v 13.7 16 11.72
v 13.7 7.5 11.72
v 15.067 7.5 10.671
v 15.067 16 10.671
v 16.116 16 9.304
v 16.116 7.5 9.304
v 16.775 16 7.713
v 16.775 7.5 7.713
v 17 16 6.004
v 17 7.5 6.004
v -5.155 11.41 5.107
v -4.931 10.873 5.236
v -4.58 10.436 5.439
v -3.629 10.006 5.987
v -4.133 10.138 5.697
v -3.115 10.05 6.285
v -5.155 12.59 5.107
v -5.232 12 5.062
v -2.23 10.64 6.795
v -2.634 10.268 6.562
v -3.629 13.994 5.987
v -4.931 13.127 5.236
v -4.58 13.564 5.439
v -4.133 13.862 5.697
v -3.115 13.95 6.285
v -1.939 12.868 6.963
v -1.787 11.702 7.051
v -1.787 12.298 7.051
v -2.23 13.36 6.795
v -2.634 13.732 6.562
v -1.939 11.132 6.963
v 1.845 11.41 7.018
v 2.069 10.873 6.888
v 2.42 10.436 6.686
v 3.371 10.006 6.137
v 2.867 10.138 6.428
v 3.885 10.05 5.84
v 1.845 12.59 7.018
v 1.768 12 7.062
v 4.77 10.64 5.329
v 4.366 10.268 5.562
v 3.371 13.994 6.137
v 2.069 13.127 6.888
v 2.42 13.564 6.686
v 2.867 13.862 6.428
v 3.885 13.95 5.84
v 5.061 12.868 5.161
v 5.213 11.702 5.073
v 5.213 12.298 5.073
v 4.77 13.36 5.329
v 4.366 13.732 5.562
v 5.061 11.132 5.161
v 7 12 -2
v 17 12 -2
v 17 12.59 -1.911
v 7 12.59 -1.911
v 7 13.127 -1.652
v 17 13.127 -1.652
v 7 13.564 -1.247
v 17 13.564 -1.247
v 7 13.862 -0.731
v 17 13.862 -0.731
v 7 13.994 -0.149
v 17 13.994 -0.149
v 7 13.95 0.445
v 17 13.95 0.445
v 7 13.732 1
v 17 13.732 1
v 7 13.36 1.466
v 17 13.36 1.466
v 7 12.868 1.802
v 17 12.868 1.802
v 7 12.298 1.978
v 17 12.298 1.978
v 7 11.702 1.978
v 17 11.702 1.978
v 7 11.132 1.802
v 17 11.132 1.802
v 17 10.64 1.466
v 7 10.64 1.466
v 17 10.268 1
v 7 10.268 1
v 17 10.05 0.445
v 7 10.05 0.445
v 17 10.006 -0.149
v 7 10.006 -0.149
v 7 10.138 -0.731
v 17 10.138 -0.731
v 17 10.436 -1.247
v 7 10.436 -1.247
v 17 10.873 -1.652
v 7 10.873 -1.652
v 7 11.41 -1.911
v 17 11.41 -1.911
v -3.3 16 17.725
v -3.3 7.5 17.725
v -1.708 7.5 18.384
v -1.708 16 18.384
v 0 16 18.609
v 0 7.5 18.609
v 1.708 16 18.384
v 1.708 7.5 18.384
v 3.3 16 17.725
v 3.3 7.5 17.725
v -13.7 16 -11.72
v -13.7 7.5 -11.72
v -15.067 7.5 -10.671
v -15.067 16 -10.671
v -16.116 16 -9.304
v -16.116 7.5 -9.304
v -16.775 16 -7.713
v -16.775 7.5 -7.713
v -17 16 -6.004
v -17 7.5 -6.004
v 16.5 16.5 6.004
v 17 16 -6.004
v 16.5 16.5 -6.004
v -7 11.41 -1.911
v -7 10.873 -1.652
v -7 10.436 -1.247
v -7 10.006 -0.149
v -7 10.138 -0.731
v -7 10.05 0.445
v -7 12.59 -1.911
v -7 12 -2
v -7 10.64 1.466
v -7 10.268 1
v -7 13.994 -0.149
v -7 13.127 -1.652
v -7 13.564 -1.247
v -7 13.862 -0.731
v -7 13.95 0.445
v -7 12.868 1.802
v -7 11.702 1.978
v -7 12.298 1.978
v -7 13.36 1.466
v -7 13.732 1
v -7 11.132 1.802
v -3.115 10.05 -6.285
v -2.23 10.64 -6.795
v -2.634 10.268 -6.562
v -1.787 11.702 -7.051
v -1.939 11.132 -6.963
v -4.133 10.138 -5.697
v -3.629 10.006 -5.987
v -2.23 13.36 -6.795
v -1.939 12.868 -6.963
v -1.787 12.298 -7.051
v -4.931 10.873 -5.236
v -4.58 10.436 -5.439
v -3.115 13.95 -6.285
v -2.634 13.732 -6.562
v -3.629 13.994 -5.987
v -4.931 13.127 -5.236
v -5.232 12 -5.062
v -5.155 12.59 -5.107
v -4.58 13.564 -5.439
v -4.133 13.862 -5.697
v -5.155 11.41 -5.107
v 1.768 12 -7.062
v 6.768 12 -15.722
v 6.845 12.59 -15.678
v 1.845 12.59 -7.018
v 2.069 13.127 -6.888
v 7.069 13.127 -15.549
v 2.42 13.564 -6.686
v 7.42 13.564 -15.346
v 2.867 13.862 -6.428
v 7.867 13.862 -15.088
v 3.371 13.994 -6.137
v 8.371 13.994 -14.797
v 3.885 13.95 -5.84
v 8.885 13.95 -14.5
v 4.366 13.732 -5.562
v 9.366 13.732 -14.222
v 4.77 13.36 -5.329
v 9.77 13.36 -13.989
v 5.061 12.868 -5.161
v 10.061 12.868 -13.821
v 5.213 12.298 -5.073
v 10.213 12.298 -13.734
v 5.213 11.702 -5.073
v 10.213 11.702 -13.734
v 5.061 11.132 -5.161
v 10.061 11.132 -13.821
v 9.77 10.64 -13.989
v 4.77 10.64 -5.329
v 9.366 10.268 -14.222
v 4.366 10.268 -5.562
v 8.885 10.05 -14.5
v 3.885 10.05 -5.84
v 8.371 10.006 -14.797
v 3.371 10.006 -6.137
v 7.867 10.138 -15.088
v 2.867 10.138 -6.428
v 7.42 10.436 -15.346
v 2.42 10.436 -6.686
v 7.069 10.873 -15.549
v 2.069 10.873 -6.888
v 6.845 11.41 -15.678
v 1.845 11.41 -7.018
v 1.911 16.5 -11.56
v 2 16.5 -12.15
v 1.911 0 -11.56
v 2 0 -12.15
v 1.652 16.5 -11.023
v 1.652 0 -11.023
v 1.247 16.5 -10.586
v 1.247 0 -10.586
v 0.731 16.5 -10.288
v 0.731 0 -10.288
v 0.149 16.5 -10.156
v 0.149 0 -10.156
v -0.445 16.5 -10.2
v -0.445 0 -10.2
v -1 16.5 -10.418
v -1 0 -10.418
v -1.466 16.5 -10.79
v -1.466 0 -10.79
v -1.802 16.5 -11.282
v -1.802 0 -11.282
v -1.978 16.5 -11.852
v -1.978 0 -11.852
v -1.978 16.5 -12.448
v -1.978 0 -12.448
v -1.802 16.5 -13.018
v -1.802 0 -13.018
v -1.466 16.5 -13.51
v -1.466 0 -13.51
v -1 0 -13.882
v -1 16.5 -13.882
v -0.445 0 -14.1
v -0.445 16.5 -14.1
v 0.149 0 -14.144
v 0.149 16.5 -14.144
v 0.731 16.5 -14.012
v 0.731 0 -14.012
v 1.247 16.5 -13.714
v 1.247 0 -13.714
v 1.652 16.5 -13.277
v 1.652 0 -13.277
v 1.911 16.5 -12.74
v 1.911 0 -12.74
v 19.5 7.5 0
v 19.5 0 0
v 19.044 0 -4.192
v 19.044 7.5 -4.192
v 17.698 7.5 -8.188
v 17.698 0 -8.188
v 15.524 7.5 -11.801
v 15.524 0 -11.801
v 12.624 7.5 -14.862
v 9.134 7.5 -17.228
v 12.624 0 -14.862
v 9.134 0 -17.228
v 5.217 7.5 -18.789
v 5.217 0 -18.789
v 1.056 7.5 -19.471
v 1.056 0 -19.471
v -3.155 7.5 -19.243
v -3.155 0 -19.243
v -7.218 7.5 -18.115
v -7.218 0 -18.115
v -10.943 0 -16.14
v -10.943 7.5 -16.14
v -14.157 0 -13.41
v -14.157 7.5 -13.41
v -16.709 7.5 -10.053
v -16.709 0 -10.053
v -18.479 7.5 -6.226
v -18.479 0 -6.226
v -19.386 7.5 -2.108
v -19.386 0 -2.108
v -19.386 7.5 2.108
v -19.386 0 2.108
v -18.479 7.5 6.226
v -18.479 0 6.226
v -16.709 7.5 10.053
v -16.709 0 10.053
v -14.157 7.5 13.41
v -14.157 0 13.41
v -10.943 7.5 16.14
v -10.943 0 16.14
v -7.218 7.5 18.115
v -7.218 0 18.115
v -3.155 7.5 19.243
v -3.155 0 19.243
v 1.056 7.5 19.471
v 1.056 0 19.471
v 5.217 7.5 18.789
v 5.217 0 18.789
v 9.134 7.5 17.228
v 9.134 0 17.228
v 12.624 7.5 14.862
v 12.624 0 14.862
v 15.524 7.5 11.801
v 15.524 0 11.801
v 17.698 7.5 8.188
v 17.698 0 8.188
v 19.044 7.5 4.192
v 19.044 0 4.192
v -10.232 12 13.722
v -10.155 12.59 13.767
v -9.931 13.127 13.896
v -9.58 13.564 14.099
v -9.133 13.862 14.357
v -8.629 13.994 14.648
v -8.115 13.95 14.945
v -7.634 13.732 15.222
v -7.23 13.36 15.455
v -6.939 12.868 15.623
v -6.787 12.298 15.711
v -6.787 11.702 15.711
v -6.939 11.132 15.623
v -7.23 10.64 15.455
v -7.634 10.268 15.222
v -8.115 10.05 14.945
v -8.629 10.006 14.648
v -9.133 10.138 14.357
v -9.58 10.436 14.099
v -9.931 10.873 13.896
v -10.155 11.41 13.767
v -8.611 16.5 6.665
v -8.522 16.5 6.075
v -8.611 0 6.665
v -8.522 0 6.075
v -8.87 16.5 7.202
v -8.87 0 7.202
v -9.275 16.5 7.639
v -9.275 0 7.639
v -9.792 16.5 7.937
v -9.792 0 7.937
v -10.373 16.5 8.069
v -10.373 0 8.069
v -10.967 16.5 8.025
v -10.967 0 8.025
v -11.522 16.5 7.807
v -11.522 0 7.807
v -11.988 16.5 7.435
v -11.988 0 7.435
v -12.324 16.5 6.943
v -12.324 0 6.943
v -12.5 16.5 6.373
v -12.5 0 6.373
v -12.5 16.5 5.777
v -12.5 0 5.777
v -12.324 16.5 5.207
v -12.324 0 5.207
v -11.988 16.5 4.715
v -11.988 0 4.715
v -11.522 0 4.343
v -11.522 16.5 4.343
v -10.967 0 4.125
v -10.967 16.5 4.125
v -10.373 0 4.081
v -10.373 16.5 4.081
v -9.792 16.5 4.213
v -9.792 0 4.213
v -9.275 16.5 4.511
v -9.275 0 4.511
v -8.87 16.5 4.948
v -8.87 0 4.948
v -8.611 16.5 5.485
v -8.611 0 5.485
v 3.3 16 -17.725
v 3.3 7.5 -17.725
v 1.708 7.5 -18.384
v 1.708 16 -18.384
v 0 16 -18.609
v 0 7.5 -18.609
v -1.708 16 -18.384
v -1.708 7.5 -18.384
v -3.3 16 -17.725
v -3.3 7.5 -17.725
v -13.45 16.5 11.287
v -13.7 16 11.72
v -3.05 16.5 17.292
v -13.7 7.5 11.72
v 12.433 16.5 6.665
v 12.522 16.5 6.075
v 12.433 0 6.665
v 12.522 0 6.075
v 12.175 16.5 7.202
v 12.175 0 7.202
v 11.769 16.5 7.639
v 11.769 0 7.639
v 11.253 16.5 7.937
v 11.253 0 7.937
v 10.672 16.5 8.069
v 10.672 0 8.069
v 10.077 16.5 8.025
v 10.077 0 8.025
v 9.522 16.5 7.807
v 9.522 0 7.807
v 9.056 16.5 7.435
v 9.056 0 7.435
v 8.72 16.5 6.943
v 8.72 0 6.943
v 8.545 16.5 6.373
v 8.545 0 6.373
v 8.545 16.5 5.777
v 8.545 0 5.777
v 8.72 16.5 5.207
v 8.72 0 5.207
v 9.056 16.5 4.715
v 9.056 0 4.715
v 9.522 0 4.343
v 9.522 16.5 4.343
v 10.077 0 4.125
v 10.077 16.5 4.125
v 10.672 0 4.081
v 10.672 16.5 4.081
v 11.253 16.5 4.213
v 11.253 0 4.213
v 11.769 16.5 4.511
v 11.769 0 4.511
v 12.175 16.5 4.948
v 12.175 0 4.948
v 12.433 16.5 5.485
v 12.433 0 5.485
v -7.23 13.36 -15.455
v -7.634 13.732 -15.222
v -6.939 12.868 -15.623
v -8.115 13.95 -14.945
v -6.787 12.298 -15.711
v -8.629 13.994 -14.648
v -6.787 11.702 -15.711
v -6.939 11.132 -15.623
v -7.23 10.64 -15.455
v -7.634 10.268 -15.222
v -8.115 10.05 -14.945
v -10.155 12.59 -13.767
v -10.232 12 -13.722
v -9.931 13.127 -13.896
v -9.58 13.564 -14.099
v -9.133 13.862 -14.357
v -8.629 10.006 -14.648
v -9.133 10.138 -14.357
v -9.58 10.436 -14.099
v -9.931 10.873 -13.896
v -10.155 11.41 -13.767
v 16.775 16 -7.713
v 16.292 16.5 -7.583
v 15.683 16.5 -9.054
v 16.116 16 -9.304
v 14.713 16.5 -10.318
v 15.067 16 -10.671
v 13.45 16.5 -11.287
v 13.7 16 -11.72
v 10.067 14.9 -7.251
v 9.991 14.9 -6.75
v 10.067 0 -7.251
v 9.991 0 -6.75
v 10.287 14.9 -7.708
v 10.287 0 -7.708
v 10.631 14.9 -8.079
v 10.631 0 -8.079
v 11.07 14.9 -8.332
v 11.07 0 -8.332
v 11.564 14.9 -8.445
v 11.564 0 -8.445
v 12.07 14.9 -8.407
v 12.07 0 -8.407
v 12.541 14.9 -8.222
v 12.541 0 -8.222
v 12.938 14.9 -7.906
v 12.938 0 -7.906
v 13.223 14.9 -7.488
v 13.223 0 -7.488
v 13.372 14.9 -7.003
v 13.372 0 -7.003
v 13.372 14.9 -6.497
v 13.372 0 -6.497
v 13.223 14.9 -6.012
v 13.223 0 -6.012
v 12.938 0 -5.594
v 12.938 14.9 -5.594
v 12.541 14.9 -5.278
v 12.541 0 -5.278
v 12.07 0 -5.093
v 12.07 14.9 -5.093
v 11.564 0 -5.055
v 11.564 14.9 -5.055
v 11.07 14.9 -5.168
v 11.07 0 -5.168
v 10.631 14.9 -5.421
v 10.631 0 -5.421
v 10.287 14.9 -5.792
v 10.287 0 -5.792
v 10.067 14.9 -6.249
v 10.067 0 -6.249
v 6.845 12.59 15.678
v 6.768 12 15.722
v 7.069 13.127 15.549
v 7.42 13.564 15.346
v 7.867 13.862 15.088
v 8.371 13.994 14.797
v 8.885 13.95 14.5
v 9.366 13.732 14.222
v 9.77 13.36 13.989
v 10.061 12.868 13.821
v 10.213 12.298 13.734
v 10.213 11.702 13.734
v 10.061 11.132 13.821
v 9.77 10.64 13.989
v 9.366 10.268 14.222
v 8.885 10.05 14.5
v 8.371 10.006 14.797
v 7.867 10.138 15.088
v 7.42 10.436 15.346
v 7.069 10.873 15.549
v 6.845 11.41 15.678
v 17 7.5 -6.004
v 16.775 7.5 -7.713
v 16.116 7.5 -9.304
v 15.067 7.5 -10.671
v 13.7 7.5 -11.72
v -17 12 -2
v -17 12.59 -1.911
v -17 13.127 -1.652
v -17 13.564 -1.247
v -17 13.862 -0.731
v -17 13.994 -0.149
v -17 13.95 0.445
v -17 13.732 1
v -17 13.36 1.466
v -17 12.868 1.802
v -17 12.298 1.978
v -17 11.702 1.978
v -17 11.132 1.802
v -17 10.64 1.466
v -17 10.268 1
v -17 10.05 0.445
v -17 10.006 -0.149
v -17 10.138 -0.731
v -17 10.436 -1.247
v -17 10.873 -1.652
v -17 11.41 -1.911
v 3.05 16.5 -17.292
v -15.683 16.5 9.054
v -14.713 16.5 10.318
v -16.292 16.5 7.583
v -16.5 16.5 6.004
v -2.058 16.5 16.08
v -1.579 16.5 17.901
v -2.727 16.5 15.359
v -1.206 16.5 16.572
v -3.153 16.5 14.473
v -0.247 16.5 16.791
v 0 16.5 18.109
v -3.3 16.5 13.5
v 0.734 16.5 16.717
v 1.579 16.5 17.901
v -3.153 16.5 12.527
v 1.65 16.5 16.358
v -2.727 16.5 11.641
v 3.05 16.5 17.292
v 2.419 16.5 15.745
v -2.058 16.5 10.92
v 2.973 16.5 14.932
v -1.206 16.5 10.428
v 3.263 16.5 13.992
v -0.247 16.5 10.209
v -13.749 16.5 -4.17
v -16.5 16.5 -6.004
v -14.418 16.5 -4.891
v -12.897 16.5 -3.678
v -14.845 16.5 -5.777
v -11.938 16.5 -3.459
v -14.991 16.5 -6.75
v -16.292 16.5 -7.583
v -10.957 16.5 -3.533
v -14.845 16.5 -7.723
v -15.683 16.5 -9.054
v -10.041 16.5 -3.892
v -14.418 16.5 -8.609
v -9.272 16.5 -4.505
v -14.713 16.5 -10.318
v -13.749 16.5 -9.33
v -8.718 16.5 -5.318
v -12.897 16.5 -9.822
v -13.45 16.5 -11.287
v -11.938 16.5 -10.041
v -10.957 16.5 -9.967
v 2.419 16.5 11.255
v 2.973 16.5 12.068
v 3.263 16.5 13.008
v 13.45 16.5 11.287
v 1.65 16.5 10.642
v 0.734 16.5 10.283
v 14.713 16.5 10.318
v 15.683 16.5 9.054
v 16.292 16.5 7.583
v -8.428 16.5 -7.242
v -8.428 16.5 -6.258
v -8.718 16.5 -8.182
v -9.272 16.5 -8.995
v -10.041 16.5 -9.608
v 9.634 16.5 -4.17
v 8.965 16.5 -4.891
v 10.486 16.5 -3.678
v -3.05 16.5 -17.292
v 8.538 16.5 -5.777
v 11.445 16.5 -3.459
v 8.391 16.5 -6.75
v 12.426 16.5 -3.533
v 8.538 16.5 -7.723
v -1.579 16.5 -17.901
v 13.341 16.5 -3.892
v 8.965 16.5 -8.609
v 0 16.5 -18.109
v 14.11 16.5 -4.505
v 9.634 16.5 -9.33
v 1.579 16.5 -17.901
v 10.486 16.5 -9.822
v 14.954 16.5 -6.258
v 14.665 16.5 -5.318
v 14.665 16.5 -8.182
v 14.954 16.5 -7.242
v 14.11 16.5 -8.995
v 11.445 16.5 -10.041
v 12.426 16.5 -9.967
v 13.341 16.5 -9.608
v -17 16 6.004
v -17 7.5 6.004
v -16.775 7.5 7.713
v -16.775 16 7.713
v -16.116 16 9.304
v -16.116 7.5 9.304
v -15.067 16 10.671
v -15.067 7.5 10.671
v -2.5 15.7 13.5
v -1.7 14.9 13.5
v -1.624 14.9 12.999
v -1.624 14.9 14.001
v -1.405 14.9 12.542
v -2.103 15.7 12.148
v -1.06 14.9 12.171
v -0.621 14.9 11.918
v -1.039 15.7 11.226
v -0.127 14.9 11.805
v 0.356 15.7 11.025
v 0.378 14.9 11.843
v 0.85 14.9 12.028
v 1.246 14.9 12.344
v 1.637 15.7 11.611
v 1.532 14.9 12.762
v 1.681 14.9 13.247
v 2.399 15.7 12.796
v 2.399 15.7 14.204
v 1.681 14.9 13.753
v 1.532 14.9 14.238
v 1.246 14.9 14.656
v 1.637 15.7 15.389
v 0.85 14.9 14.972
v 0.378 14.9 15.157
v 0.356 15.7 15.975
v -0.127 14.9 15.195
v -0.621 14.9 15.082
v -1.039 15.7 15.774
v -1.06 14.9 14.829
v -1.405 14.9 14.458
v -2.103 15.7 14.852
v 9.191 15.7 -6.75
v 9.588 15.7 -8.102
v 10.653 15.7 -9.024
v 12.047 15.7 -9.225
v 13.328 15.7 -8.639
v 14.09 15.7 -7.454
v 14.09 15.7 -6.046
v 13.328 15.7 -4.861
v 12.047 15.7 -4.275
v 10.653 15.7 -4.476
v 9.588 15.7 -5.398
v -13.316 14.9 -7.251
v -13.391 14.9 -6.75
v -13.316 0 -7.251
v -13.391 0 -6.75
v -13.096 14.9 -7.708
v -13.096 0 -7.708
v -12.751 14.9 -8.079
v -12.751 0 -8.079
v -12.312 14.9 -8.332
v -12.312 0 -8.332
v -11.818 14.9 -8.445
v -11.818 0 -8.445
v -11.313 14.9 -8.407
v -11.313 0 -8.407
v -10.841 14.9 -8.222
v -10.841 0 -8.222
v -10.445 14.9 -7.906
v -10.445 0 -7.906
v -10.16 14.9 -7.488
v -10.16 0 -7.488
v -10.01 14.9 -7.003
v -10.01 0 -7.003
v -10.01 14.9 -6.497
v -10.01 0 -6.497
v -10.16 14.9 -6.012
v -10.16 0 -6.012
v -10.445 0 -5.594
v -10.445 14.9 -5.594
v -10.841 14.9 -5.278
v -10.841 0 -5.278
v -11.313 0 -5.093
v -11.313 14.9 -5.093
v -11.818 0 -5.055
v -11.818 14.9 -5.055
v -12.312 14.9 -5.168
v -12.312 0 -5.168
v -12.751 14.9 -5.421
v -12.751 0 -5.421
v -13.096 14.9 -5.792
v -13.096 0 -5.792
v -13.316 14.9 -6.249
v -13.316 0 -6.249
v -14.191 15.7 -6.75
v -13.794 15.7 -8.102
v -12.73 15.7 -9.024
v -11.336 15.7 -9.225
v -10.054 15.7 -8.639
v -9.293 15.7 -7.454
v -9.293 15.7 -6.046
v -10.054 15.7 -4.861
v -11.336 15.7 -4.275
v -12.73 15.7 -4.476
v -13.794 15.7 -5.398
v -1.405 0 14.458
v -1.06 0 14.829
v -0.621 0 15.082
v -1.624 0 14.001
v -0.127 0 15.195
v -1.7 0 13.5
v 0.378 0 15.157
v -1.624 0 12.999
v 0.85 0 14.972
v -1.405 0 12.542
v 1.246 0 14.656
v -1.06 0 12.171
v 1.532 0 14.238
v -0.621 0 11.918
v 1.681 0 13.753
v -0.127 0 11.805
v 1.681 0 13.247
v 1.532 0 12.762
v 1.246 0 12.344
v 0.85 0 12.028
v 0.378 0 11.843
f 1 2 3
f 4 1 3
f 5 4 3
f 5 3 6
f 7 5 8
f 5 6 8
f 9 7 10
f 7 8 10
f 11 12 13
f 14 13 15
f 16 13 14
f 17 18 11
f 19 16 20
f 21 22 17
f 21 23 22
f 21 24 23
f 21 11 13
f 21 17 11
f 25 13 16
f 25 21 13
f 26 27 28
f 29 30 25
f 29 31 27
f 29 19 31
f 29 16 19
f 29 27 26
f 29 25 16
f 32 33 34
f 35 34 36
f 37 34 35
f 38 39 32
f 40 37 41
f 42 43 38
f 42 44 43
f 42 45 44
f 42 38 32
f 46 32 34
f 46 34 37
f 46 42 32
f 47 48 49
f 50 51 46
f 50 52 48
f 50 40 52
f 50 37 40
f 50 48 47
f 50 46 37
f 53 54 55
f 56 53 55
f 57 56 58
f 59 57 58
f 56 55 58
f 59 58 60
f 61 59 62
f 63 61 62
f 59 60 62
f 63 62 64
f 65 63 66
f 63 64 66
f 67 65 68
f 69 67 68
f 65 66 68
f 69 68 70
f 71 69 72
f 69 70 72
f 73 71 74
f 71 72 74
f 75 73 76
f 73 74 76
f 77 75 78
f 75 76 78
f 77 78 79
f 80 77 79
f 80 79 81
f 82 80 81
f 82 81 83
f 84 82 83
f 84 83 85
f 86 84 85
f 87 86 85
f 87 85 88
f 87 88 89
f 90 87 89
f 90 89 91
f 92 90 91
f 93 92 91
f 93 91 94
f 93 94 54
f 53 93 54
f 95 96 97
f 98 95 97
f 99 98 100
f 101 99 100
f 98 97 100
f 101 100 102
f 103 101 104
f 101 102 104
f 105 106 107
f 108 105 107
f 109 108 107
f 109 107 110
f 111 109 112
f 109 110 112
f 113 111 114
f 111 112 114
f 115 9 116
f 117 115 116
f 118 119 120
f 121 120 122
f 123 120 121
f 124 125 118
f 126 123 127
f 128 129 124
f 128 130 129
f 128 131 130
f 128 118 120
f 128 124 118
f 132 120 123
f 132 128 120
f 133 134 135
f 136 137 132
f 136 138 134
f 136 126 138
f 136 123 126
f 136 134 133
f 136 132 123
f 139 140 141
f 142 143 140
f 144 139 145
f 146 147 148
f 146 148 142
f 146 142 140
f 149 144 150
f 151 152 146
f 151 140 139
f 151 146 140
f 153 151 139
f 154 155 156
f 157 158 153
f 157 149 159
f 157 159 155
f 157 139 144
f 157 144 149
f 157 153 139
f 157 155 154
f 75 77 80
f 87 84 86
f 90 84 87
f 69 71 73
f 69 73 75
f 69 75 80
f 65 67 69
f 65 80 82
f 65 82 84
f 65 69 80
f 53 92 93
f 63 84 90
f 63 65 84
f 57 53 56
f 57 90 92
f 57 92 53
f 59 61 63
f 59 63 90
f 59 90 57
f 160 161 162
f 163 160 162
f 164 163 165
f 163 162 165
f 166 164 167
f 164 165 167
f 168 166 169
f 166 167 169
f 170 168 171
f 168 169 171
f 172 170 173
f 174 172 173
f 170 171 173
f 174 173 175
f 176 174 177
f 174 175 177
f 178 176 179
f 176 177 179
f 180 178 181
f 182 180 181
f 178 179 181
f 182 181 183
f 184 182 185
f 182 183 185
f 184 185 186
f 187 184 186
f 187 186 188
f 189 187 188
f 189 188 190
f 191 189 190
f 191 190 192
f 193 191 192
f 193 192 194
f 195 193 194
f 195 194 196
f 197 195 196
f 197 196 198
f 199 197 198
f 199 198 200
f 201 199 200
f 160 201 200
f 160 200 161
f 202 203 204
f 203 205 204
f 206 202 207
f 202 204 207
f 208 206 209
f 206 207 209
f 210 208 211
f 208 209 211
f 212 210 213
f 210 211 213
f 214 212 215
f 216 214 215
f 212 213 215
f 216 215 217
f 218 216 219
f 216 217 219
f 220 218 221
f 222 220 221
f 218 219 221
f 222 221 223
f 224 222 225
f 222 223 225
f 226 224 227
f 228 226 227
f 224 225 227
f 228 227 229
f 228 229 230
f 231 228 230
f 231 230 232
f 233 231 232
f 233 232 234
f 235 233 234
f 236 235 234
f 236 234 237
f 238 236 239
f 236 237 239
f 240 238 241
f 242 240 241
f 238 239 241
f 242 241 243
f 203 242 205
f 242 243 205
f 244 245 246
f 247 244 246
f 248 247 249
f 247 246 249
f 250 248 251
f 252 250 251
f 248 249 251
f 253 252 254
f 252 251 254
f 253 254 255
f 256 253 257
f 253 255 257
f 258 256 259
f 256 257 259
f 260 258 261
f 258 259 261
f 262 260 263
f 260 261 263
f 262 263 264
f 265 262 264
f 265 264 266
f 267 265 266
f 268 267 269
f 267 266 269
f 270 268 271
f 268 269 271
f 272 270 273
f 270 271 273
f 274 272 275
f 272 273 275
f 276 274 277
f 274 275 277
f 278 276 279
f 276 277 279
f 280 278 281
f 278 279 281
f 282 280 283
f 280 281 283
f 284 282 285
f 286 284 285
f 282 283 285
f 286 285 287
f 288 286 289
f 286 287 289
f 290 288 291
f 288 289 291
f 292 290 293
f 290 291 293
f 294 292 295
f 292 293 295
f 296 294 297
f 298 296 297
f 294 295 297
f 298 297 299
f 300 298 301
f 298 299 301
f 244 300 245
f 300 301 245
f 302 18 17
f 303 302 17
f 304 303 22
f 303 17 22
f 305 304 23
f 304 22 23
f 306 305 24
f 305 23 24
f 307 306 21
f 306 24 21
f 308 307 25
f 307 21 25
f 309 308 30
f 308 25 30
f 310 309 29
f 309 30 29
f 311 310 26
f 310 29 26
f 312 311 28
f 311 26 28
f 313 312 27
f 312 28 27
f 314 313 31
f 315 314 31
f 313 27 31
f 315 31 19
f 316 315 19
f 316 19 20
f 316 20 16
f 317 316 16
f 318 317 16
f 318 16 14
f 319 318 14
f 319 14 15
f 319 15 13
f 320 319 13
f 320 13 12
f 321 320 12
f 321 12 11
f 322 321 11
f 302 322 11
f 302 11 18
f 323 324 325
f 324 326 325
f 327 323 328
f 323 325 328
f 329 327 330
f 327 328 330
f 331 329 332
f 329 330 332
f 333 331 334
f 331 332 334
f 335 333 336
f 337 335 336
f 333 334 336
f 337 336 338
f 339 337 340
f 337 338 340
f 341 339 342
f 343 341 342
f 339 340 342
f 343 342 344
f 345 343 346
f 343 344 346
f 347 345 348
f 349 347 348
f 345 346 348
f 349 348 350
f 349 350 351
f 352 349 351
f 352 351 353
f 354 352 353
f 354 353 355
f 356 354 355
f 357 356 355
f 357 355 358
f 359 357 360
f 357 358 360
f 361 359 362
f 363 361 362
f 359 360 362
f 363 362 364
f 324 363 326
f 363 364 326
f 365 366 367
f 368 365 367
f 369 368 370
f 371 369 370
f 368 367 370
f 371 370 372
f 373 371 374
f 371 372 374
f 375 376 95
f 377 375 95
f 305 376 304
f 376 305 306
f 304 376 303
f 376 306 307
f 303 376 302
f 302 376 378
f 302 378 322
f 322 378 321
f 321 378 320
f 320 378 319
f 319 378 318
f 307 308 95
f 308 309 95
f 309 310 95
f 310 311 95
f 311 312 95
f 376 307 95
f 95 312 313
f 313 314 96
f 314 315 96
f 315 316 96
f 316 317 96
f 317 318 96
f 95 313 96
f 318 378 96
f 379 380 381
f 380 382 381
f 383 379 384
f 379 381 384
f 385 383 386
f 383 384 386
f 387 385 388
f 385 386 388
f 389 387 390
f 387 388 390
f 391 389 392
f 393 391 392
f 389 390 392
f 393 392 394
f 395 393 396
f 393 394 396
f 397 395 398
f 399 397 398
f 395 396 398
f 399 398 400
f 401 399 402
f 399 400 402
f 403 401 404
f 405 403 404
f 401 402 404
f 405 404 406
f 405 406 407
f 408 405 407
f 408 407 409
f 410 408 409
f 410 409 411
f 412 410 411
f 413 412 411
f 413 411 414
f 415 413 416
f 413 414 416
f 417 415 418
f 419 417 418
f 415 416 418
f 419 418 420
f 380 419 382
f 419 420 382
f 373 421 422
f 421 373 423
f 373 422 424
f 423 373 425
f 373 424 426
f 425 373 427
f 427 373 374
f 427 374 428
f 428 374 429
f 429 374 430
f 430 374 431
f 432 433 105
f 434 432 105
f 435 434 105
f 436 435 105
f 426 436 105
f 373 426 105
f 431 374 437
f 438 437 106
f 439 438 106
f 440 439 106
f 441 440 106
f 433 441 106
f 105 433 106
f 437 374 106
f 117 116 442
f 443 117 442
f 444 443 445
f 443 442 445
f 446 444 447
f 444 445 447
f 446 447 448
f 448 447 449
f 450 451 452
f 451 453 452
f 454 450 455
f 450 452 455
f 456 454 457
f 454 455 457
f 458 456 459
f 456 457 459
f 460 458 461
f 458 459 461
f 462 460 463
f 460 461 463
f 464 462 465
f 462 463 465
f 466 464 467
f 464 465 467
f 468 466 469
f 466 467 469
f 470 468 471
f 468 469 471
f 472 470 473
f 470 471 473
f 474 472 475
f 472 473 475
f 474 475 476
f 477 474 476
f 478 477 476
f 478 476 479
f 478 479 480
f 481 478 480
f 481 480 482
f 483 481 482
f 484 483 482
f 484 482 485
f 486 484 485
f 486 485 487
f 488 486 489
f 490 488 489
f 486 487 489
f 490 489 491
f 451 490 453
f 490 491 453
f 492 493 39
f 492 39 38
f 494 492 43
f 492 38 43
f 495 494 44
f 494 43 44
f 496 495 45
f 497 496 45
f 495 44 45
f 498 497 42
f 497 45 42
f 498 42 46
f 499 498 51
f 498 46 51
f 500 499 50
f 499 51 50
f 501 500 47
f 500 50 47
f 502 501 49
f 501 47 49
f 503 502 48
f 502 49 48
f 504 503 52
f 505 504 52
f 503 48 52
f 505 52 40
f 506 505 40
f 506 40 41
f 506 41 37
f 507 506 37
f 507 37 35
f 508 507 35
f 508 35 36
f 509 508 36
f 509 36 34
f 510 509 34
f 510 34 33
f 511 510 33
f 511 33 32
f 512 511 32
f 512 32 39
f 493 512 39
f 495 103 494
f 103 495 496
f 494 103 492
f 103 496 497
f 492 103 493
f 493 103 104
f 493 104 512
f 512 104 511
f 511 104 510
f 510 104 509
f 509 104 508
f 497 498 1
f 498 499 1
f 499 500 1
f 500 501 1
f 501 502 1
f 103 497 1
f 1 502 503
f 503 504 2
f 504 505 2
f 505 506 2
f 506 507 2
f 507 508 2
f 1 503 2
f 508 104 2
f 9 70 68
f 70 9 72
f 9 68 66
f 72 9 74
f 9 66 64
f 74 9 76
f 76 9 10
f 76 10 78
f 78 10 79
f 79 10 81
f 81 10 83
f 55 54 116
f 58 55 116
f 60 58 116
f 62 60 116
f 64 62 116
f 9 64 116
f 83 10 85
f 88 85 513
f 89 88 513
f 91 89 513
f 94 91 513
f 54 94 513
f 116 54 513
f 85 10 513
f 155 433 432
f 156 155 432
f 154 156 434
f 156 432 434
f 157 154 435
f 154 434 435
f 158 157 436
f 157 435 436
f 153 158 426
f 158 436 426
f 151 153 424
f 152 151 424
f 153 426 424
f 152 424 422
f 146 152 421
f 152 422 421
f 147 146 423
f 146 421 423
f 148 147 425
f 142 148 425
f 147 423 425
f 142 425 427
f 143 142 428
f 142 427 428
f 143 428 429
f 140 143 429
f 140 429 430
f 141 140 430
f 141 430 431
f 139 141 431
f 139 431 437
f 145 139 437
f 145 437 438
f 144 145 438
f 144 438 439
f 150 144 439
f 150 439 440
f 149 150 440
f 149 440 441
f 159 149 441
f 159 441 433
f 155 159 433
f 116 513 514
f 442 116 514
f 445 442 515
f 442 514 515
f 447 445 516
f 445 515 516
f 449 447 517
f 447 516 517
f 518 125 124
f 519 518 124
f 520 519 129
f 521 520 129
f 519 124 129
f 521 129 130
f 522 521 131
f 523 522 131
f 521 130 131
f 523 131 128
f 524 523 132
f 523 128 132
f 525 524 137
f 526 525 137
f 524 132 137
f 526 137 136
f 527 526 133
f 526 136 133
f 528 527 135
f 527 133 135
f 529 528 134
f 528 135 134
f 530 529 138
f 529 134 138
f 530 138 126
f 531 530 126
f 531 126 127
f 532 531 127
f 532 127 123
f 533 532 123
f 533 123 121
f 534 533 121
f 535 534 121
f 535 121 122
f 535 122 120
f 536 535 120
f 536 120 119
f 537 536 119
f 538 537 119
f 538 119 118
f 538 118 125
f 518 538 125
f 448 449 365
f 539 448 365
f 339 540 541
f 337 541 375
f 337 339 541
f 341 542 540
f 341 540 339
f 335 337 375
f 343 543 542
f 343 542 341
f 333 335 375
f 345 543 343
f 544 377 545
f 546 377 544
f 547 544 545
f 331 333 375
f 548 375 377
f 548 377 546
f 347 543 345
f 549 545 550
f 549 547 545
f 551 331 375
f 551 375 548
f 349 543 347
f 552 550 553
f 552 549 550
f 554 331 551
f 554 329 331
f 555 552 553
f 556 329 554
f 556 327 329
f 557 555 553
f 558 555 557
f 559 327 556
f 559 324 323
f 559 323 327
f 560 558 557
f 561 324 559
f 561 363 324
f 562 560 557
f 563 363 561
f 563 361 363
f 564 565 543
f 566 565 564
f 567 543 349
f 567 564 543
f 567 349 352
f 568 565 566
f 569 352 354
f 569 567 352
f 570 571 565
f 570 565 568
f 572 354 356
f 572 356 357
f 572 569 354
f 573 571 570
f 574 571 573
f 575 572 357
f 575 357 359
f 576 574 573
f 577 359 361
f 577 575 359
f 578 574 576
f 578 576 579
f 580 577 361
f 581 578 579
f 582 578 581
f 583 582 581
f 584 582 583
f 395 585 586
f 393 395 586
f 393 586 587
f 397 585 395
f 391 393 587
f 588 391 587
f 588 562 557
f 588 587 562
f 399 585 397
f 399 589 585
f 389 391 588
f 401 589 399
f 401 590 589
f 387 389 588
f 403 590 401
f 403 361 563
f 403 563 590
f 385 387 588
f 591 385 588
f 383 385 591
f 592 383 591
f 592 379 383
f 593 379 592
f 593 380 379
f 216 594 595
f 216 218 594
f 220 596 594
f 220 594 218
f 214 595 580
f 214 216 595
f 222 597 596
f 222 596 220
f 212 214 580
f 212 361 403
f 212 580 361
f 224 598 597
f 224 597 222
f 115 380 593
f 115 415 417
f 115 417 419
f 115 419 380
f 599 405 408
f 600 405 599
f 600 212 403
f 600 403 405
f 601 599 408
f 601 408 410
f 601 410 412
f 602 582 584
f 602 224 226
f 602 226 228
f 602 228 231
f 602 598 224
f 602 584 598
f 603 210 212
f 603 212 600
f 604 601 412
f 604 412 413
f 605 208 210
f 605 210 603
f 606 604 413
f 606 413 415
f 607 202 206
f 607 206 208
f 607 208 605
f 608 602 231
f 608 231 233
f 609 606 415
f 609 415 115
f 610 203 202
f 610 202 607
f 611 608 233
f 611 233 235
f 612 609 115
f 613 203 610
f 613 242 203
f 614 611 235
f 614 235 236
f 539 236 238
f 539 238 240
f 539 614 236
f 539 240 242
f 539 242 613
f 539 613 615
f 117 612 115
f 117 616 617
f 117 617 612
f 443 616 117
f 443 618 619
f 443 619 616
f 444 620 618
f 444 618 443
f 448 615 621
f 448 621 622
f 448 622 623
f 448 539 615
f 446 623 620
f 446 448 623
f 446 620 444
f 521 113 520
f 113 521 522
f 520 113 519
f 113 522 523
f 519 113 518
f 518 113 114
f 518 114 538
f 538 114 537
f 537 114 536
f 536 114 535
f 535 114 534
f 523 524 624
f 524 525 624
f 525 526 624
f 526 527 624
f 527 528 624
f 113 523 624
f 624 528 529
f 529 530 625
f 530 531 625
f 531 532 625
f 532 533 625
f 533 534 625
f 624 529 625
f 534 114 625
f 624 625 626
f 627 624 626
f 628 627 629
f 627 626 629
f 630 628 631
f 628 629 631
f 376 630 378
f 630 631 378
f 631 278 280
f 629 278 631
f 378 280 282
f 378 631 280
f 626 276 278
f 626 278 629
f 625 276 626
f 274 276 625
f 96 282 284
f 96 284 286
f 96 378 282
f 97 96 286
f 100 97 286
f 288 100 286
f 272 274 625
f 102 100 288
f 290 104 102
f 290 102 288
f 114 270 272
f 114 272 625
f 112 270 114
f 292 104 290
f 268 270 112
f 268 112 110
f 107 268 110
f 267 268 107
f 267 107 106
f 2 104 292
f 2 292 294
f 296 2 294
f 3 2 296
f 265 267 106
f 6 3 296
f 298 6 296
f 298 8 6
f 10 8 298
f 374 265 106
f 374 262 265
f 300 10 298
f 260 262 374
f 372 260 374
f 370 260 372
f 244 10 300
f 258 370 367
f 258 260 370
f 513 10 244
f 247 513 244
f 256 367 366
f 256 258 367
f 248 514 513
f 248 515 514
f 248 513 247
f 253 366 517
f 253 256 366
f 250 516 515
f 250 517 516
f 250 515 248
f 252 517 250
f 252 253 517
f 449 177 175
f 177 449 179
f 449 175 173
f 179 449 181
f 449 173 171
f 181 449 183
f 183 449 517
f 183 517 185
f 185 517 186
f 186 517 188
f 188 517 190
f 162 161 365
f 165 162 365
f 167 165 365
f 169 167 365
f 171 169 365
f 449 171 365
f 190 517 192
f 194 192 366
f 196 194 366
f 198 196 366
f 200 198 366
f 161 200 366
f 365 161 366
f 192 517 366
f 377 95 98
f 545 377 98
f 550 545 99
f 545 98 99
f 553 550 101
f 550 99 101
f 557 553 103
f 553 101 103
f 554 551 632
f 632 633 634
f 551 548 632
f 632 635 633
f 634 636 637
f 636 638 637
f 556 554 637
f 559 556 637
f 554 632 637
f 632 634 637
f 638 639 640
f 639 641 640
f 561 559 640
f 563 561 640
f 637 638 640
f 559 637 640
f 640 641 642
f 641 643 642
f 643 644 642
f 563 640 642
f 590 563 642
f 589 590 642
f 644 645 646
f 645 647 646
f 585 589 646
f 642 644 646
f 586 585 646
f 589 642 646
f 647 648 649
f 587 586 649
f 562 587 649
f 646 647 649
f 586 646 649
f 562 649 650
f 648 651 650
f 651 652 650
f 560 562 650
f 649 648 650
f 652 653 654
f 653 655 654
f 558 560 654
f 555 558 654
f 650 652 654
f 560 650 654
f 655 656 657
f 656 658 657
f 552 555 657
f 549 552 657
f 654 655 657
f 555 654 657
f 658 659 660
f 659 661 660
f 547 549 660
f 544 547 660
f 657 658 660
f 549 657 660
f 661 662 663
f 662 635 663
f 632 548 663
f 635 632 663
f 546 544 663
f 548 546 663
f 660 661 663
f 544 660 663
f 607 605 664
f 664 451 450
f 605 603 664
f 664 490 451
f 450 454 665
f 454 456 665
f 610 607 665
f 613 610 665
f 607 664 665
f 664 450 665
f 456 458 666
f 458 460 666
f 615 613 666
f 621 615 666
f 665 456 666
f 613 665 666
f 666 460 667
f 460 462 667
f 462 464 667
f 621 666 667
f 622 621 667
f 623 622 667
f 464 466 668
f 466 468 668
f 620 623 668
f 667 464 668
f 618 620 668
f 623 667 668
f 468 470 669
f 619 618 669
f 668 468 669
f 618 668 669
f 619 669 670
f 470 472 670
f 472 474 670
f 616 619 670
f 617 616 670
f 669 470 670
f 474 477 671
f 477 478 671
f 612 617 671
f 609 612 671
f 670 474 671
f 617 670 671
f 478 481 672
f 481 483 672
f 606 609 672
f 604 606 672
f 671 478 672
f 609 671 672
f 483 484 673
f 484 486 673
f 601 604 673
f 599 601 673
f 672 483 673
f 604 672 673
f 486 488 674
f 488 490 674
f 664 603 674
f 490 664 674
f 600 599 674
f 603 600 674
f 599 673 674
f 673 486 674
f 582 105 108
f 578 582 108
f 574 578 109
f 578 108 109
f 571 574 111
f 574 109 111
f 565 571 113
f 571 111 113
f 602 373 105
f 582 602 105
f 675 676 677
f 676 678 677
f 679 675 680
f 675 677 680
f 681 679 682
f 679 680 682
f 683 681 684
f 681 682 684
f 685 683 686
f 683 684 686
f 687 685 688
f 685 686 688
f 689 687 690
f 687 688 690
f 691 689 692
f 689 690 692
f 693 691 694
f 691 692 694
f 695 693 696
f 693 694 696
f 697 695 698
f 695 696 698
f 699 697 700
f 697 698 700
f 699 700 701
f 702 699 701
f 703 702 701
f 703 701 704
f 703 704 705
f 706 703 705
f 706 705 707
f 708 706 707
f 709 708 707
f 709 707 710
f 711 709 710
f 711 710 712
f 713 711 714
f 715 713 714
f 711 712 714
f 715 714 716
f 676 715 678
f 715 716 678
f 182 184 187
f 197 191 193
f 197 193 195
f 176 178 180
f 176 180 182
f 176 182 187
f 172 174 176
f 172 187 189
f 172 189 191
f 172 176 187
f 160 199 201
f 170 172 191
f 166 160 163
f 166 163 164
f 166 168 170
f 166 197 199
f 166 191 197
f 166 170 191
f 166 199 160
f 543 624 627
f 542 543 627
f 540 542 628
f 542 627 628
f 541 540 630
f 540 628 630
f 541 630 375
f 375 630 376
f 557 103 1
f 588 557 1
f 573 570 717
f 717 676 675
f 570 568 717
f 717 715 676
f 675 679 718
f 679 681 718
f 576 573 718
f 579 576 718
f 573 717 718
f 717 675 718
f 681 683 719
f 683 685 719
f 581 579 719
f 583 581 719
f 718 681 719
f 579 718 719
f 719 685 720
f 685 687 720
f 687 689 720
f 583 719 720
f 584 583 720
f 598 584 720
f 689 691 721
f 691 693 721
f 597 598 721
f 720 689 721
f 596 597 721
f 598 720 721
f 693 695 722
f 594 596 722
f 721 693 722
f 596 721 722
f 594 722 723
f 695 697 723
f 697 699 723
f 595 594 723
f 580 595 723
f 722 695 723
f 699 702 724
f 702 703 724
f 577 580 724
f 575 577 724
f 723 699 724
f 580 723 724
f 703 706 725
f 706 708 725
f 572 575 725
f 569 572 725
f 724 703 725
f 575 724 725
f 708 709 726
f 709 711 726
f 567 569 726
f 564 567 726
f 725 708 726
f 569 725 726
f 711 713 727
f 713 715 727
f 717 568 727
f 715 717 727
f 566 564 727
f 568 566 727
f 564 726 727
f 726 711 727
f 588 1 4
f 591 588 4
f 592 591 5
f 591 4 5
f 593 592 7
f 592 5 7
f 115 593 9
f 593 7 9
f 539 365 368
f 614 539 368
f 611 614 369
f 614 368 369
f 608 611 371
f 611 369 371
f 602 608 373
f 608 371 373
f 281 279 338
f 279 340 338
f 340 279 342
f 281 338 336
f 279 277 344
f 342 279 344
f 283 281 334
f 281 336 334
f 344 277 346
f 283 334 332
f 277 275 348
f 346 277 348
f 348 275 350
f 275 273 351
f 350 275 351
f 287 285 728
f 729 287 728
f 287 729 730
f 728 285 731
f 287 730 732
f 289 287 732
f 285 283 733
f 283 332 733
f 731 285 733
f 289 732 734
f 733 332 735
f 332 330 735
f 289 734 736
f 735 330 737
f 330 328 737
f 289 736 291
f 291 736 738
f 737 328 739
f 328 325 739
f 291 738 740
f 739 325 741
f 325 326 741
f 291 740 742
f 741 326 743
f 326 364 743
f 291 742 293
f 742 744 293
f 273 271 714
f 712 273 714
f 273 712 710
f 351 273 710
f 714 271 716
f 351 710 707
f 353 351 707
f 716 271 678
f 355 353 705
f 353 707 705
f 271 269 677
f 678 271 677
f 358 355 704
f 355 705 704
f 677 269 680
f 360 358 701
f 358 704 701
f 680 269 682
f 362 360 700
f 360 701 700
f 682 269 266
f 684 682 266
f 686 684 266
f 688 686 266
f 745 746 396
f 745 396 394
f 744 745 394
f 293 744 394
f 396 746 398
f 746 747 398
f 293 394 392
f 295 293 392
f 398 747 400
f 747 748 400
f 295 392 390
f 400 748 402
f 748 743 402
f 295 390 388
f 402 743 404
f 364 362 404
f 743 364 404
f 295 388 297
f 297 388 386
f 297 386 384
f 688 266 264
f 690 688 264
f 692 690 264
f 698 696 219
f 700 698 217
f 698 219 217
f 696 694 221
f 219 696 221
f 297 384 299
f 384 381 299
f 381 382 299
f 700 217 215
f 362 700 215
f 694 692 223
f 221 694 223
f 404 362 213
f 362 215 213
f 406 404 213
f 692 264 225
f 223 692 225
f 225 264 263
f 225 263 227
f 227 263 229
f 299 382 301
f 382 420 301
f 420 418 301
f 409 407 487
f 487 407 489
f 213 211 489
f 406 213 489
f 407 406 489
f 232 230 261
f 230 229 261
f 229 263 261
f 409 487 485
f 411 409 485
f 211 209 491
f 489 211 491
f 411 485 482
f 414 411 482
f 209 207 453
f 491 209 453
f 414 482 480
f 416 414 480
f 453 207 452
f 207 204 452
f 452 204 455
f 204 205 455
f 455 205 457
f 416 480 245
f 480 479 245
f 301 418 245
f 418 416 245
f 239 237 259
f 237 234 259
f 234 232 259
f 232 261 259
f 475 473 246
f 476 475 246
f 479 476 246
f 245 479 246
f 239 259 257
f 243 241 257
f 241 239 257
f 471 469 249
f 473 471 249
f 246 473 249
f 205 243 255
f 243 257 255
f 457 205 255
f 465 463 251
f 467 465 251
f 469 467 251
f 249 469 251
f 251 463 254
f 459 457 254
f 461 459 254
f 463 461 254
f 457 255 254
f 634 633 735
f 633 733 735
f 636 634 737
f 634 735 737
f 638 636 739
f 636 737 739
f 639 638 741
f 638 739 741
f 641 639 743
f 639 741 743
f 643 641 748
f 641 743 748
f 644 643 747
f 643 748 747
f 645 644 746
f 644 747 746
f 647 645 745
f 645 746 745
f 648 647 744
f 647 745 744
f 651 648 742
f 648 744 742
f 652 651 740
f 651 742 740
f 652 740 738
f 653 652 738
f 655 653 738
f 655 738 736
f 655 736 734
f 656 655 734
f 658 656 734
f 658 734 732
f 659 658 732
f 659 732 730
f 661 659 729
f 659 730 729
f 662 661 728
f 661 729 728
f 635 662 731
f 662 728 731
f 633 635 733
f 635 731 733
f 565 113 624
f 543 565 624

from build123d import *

# Parameters (mm, degrees)
SKETCH_9_R                = 19.5
SKETCH_9_R_2              = 2
SKETCH_9_R_3              = 1.5
EXTRUDE_1_DEPTH           = 7.5
EXTRUDE_2_DEPTH           = 12
SKETCH_15_R               = 2
CUT_EXTRUDE_2_DEPTH       = 10.637495374
CUT_EXTRUDE_2_DEPTH_BACK  = 44.637495374
SKETCH_16_R               = 2
CUT_EXTRUDE_3_DEPTH       = 10.637495374
CUT_EXTRUDE_3_DEPTH_BACK  = 44.637495374
SKETCH_17_R               = 2
CUT_EXTRUDE_4_DEPTH       = 3.5
CUT_EXTRUDE_4_DEPTH_BACK  = 37.5
EXTRUDE_3_DEPTH           = 19.5
SKETCH_19_R               = 1.5
SKETCH_19_R_2             = 2
CUT_EXTRUDE_5_DEPTH       = 8.5
CUT_EXTRUDE_5_DEPTH_BACK  = 13
HOLE_WIZARD_3_D           = 3.4
HOLE_WIZARD_3_CSINK_D     = 6.6
HOLE_WIZARD_3_CSINK_ANGLE = 90
CUT_EXTRUDE_6_DEPTH       = 3
CHAMFER_2_SIZE            = 0.5
HOLE_WIZARD_4_D           = 3.2
HOLE_WIZARD_4_CSINK_D     = 6.6
HOLE_WIZARD_4_CSINK_ANGLE = 90


with BuildPart() as part:
    # 草图9 → 凸台-拉伸1 (new body)
    with BuildSketch(Plane(origin=(0, 0, 0), x_dir=(1, 0, 0), z_dir=(0, 1, 0))):
        Circle(SKETCH_9_R)
        with Locations((0, 12.15)):
            Circle(SKETCH_9_R_2, mode=Mode.SUBTRACT)
        with Locations((-10.522208656, -6.075)):
            Circle(SKETCH_9_R_2, mode=Mode.SUBTRACT)
        with Locations((10.522208656, -6.075)):
            Circle(SKETCH_9_R_2, mode=Mode.SUBTRACT)
        with Locations((-11.691342951, 6.75)):
            Circle(SKETCH_9_R_3, mode=Mode.SUBTRACT)
        with Locations((0, -13.5)):
            Circle(SKETCH_9_R_3, mode=Mode.SUBTRACT)
        with Locations((11.691342951, 6.75)):
            Circle(SKETCH_9_R_3, mode=Mode.SUBTRACT)
    extrude(amount=EXTRUDE_1_DEPTH)

    # 草图13 → 凸台-拉伸2 (add)
    with BuildSketch(Plane(origin=(0, 7.5, 0), x_dir=(1, 0, 0), z_dir=(0, 1, 0))):
        with BuildLine():
            Line((-13.7, -11.720210465), (-3.3, -17.724653264))
            ThreePointArc((-3.3, -17.724653264), (0, -18.608885599), (3.3, -17.724653264))
            Line((3.3, -17.724653264), (13.7, -11.720210465))
            ThreePointArc((13.7, -11.720210465), (16.115767665, -9.3044428), (17, -6.0044428))
            Line((17, -6.0044428), (17, 6.0044428))
            ThreePointArc((17, 6.0044428), (16.115767665, 9.3044428), (13.7, 11.720210465))
            Line((13.7, 11.720210465), (3.3, 17.724653264))
            ThreePointArc((3.3, 17.724653264), (0, 18.608885599), (-3.3, 17.724653264))
            Line((-3.3, 17.724653264), (-13.7, 11.720210465))
            ThreePointArc((-13.7, 11.720210465), (-16.115767665, 9.3044428), (-17, 6.0044428))
            Line((-17, 6.0044428), (-17, -6.0044428))
            ThreePointArc((-17, -6.0044428), (-16.115767665, -9.3044428), (-13.7, -11.720210465))
        make_face()
    extrude(amount=EXTRUDE_2_DEPTH)

    # 草图15 → 切除-拉伸2 (cut, two sides)
    with BuildSketch(Plane(origin=(-8.5, 0, -14.722431864), x_dir=(-0.866025404, 0, 0.5), z_dir=(-0.5, 0, -0.866025404))) as cut_extrude_2_sk:
        with Locations((0, 12)):
            Circle(SKETCH_15_R)
    extrude(amount=CUT_EXTRUDE_2_DEPTH, mode=Mode.SUBTRACT)
    extrude(cut_extrude_2_sk.sketch, amount=-CUT_EXTRUDE_2_DEPTH_BACK, mode=Mode.SUBTRACT)

    # 草图16 → 切除-拉伸3 (cut, two sides)
    with BuildSketch(Plane(origin=(8.5, 0, -14.722431864), x_dir=(-0.866025404, 0, -0.5), z_dir=(0.5, 0, -0.866025404))) as cut_extrude_3_sk:
        with Locations((0, 12)):
            Circle(SKETCH_16_R)
    extrude(amount=CUT_EXTRUDE_3_DEPTH, mode=Mode.SUBTRACT)
    extrude(cut_extrude_3_sk.sketch, amount=-CUT_EXTRUDE_3_DEPTH_BACK, mode=Mode.SUBTRACT)

    # 草图17 → 切除-拉伸4 (cut, two sides)
    with BuildSketch(Plane(origin=(17, 0, 0), x_dir=(0, 0, -1), z_dir=(1, 0, 0))) as cut_extrude_4_sk:
        with Locations((0, 12)):
            Circle(SKETCH_17_R)
    extrude(amount=CUT_EXTRUDE_4_DEPTH, mode=Mode.SUBTRACT)
    extrude(cut_extrude_4_sk.sketch, amount=-CUT_EXTRUDE_4_DEPTH_BACK, mode=Mode.SUBTRACT)

    # 草图18 → 凸台-拉伸3 (add)
    with BuildSketch(Plane(origin=(0, 19.5, 0), x_dir=(1, 0, 0), z_dir=(0, 1, 0))):
        Polygon((-7, -4.041451884), (0, -8.082903769), (7, -4.041451884), (7, 4.041451884), (0, 8.082903769), (-7, 4.041451884), align=None)
    extrude(amount=-EXTRUDE_3_DEPTH)

    # 草图19 → 切除-拉伸5 (cut, two sides)
    with BuildSketch(Plane.XZ.offset(-7.5)) as cut_extrude_5_sk:
        with Locations((-11.691342951, -6.75)):
            Circle(SKETCH_19_R)
        with Locations((-10.522208656, 6.075)):
            Circle(SKETCH_19_R_2)
        with Locations((0, 13.5)):
            Circle(SKETCH_19_R)
        with Locations((10.522208656, 6.075)):
            Circle(SKETCH_19_R_2)
        with Locations((11.691342951, -6.75)):
            Circle(SKETCH_19_R)
        with Locations((0, -12.15)):
            Circle(SKETCH_19_R_2)
    extrude(amount=CUT_EXTRUDE_5_DEPTH, mode=Mode.SUBTRACT)
    extrude(cut_extrude_5_sk.sketch, amount=-CUT_EXTRUDE_5_DEPTH_BACK, mode=Mode.SUBTRACT)

    # 打孔尺寸(%根据十字)槽沉头木螺钉的类型3 (through all)
    with Locations(Plane(origin=(0, 19.5, 0), x_dir=(1, 0, 0), z_dir=(0, 1, 0))):
        with Locations((11.691342951, 6.75), (0, -13.5), (-11.691342951, 6.75)):
            CounterSinkHole(HOLE_WIZARD_3_D / 2, HOLE_WIZARD_3_CSINK_D / 2, counter_sink_angle=HOLE_WIZARD_3_CSINK_ANGLE)

    # 草图26 → 切除-拉伸6 (cut)
    with BuildSketch(Plane(origin=(0, 19.5, 0), x_dir=(1, 0, 0), z_dir=(0, 1, 0))):
        with BuildLine():
            Line((17, -6.0044428), (17, 6.0044428))
            ThreePointArc((17, 6.0044428), (16.115767665, 9.3044428), (13.7, 11.720210465))
            Line((13.7, 11.720210465), (3.3, 17.724653264))
            ThreePointArc((3.3, 17.724653264), (0, 18.608885599), (-3.3, 17.724653264))
            Line((-3.3, 17.724653264), (-13.7, 11.720210465))
            ThreePointArc((-13.7, 11.720210465), (-16.115767665, 9.3044428), (-17, 6.0044428))
            Line((-17, 6.0044428), (-17, -6.0044428))
            ThreePointArc((-17, -6.0044428), (-16.115767665, -9.3044428), (-13.7, -11.720210465))
            Line((-13.7, -11.720210465), (-3.3, -17.724653264))
            ThreePointArc((-3.3, -17.724653264), (0, -18.608885599), (3.3, -17.724653264))
            Line((3.3, -17.724653264), (13.7, -11.720210465))
            ThreePointArc((13.7, -11.720210465), (16.115767665, -9.3044428), (17, -6.0044428))
        make_face()
    extrude(amount=-CUT_EXTRUDE_6_DEPTH, mode=Mode.SUBTRACT)

    # 倒角2
    chamfer_2_edges = [part.edges().sort_by_distance(p)[0] for p in [
        (16.115767665, 16.5, 9.3044428),
        (8.5, 16.5, 14.722431864),
        (0, 16.5, 18.608885599),
        (-8.5, 16.5, 14.722431864),
        (-16.115767665, 16.5, 9.3044428),
        (-17, 16.5, 0),
        (-16.115767665, 16.5, -9.3044428),
        (-8.5, 16.5, -14.722431864),
        (0, 16.5, -18.608885599),
        (8.5, 16.5, -14.722431864),
        (16.115767665, 16.5, -9.3044428),
        (17, 16.5, 0),
    ]]
    chamfer(chamfer_2_edges, length=CHAMFER_2_SIZE)

    # 打孔尺寸(%根据十字)槽沉头木螺钉的类型4 (through all)
    with Locations(Plane(origin=(0, 16.5, 0), x_dir=(1, 0, 0), z_dir=(0, 1, 0))):
        with Locations((0, -13.5), (11.691342951, 6.75), (-11.691342951, 6.75)):
            CounterSinkHole(HOLE_WIZARD_4_D / 2, HOLE_WIZARD_4_CSINK_D / 2, counter_sink_angle=HOLE_WIZARD_4_CSINK_ANGLE)


solid = part.part
